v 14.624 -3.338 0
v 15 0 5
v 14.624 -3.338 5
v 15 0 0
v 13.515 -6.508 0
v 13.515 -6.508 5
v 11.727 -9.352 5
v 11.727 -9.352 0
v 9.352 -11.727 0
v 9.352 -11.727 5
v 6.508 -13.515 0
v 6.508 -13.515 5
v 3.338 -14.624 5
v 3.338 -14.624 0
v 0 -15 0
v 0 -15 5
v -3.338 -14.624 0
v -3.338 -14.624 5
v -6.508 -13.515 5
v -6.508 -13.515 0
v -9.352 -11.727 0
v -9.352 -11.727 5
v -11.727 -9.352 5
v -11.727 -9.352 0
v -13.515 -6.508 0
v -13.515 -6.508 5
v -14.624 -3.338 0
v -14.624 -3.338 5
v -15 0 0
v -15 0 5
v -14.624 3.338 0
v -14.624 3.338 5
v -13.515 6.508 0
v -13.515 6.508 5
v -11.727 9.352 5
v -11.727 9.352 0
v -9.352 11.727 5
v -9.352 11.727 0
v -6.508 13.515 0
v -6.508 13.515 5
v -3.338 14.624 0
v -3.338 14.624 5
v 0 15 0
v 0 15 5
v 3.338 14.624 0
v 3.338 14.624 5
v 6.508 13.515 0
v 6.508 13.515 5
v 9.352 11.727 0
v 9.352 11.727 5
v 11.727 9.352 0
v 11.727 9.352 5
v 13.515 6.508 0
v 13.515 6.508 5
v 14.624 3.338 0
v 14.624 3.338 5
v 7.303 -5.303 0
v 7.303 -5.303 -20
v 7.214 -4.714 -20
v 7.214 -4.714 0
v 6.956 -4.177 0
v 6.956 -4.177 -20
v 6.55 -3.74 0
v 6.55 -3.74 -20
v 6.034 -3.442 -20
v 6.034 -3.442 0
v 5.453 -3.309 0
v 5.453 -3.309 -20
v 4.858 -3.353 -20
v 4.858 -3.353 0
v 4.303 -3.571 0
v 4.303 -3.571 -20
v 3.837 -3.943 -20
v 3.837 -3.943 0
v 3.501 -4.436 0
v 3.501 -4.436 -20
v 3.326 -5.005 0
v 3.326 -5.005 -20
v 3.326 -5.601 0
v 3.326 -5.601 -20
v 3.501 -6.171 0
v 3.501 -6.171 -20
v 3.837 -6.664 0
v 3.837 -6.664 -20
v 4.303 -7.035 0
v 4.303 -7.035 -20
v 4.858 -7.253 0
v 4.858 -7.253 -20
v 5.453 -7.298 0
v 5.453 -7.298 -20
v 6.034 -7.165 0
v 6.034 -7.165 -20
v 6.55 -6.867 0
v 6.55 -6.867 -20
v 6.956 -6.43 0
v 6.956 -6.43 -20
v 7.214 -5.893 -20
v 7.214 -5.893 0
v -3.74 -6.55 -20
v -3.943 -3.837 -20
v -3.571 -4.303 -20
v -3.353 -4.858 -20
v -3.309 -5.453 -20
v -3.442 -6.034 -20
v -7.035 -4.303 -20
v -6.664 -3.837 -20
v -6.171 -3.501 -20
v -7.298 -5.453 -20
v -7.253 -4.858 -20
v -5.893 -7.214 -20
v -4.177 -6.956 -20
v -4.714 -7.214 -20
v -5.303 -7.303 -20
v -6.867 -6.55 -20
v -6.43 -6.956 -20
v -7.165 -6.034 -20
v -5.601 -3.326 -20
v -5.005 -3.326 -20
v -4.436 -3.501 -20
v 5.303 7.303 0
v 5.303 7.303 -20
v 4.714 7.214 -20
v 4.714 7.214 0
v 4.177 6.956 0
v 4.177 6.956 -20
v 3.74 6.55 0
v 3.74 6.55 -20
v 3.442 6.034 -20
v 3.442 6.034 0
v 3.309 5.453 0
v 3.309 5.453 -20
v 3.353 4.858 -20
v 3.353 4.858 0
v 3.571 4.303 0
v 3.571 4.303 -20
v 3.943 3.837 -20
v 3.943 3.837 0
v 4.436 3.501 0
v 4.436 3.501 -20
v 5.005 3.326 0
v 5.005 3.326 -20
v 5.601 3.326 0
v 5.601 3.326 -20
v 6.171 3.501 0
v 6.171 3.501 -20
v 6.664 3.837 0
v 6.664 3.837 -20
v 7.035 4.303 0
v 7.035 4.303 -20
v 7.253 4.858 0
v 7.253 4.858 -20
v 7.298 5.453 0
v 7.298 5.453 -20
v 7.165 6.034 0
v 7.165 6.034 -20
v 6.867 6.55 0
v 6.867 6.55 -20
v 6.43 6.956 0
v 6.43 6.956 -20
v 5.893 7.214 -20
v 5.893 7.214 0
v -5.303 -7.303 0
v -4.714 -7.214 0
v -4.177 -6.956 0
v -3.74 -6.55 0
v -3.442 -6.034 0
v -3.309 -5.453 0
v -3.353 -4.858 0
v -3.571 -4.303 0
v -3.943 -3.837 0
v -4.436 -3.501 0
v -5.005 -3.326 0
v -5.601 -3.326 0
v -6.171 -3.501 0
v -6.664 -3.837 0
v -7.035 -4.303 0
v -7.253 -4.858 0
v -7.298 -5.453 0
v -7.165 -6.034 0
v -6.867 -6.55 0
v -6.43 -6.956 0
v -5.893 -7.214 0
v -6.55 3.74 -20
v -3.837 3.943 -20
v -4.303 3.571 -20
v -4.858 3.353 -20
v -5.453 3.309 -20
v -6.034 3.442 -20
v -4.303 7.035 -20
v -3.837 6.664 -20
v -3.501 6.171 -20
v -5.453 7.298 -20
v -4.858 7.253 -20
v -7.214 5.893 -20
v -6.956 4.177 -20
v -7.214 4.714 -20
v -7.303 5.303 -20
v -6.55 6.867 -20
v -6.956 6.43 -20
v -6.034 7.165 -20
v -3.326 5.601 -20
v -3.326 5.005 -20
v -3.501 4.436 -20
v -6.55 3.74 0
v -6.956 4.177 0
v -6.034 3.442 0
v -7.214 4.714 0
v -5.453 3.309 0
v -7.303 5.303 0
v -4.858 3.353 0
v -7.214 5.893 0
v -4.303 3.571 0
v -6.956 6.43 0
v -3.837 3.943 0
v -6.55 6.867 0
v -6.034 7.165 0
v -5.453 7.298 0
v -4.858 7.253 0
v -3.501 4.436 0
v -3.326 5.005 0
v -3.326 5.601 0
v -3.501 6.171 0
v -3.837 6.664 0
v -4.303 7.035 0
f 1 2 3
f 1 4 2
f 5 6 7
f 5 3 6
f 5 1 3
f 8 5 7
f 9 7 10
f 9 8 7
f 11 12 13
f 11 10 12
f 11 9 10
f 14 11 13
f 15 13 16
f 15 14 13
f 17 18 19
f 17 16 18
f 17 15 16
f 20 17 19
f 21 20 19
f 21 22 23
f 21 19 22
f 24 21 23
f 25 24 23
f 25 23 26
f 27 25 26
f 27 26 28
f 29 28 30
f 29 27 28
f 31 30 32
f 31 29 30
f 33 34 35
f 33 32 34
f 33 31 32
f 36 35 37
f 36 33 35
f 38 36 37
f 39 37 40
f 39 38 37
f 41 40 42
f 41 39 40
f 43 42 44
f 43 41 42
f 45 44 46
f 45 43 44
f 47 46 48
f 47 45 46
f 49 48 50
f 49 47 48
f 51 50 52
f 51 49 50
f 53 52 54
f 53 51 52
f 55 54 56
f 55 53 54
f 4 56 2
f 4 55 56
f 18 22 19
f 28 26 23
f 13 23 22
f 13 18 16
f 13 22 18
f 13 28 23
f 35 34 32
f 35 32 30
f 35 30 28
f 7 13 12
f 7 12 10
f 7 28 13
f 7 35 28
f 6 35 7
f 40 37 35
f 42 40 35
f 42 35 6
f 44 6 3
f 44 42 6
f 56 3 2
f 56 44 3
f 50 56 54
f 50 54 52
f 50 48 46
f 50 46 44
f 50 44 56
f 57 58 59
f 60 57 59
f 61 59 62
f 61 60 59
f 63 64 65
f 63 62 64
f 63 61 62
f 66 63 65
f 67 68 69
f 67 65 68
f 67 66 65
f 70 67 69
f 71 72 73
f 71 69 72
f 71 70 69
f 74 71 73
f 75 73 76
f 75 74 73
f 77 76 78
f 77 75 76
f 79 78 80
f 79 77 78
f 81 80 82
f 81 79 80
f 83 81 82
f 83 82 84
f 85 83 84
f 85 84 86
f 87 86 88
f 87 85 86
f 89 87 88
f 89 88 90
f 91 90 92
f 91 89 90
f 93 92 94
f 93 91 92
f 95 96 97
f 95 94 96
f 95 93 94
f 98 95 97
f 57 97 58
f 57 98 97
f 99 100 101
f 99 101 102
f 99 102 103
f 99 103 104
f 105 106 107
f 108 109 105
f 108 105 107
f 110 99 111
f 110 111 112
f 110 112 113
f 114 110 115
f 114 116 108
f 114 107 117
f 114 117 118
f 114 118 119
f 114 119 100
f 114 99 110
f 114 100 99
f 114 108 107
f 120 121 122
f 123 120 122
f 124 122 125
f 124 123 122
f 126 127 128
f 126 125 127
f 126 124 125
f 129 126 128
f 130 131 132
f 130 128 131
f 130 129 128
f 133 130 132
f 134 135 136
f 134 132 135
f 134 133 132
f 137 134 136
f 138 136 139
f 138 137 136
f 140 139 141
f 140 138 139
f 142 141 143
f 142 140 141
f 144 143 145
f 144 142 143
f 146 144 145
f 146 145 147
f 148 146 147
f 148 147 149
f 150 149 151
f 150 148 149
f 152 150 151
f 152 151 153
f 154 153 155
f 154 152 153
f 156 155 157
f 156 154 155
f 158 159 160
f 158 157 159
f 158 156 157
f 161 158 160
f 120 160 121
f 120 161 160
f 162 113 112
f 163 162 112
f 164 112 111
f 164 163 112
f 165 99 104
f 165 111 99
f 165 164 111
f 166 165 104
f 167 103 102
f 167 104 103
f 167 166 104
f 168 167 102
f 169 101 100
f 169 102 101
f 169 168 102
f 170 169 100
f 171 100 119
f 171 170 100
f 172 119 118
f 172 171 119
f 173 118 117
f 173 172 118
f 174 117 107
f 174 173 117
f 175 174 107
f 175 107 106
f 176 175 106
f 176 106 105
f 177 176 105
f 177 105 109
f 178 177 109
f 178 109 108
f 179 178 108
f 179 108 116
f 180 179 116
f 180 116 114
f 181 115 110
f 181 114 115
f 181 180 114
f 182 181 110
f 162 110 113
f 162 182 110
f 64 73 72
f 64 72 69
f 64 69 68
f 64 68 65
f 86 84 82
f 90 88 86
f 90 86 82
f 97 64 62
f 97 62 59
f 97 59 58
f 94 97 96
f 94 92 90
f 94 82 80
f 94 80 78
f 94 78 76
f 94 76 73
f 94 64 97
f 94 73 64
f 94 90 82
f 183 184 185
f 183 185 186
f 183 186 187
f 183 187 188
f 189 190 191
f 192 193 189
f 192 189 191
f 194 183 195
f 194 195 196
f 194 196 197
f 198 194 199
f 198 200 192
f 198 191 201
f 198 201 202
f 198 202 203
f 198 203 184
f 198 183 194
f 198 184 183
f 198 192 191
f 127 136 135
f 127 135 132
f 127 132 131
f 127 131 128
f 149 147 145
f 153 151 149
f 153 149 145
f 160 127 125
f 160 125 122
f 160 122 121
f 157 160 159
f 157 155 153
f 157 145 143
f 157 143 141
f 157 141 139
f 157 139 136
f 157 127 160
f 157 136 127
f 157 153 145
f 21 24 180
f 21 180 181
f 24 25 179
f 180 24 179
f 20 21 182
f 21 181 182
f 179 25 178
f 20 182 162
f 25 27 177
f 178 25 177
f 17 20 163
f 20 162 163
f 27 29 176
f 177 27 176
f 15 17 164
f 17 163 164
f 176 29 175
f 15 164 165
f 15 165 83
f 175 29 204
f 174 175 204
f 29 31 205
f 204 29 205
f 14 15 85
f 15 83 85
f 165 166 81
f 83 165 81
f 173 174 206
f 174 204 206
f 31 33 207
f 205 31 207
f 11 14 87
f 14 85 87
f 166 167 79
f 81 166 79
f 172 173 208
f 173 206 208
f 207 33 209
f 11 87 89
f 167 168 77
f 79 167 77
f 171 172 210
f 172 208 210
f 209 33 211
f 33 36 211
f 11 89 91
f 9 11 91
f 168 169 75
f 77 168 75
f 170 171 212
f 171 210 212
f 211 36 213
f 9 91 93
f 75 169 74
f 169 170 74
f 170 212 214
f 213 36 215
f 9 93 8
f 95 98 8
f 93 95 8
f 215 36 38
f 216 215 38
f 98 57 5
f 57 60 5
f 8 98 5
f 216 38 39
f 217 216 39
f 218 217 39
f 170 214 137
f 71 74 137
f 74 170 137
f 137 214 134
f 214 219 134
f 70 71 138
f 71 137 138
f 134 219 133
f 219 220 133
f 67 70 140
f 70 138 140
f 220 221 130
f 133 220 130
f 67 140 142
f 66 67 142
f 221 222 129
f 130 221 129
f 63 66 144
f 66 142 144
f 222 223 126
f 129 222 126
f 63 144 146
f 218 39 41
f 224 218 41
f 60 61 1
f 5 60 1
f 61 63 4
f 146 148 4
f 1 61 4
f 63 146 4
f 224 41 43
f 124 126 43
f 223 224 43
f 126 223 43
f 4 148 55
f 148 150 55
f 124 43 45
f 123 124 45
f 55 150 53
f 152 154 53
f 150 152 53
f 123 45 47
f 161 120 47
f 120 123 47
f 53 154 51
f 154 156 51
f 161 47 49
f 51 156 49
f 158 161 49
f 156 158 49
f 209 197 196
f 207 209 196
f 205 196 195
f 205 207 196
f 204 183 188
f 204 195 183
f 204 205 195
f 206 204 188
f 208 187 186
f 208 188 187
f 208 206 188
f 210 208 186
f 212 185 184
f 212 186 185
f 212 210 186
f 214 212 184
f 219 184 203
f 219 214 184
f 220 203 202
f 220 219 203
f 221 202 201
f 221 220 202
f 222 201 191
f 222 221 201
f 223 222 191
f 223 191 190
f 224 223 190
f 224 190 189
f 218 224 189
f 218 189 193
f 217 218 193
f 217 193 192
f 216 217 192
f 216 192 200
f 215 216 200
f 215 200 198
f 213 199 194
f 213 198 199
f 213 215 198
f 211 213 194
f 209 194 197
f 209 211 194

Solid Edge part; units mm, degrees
sketch "Sketch1" plane through (0, 0, 0) normal (0, 0, 1) x (1, 0, 0)
  circle A0 centre (0, 0) radius 15
extrude "Protrusion1" add sketch "Sketch1" along normal blind 5
fillet "Round_1" [suppressed]
sketch "Sketch2" plane through (0, 0, 0) normal (0, 0, -1) x (-1, 0, 0)
  circle A0 centre (5.3033, 5.3033) radius 2
extrude "Protrusion2" add sketch "Sketch2" along normal blind 20
pattern_circular "Pattern1" count 4 over 360 about axis through (0, 0, 0) along (0, 0, 1) of "Protrusion2"
fillet "Round1" [suppressed]
extrude "Protrusion3" [suppressed]
extrude "Protrusion4" [suppressed]
fillet "Round_5" [suppressed]
fillet "Round_6" [suppressed]
extrude "ExtrudedProtrusion_9" [suppressed]
extrude "ExtrudedCutout_2" [suppressed]
fillet "Round_7" [suppressed]
fillet "Round_8" [suppressed]
extrude "ExtrudedProtrusion_10" [suppressed]
